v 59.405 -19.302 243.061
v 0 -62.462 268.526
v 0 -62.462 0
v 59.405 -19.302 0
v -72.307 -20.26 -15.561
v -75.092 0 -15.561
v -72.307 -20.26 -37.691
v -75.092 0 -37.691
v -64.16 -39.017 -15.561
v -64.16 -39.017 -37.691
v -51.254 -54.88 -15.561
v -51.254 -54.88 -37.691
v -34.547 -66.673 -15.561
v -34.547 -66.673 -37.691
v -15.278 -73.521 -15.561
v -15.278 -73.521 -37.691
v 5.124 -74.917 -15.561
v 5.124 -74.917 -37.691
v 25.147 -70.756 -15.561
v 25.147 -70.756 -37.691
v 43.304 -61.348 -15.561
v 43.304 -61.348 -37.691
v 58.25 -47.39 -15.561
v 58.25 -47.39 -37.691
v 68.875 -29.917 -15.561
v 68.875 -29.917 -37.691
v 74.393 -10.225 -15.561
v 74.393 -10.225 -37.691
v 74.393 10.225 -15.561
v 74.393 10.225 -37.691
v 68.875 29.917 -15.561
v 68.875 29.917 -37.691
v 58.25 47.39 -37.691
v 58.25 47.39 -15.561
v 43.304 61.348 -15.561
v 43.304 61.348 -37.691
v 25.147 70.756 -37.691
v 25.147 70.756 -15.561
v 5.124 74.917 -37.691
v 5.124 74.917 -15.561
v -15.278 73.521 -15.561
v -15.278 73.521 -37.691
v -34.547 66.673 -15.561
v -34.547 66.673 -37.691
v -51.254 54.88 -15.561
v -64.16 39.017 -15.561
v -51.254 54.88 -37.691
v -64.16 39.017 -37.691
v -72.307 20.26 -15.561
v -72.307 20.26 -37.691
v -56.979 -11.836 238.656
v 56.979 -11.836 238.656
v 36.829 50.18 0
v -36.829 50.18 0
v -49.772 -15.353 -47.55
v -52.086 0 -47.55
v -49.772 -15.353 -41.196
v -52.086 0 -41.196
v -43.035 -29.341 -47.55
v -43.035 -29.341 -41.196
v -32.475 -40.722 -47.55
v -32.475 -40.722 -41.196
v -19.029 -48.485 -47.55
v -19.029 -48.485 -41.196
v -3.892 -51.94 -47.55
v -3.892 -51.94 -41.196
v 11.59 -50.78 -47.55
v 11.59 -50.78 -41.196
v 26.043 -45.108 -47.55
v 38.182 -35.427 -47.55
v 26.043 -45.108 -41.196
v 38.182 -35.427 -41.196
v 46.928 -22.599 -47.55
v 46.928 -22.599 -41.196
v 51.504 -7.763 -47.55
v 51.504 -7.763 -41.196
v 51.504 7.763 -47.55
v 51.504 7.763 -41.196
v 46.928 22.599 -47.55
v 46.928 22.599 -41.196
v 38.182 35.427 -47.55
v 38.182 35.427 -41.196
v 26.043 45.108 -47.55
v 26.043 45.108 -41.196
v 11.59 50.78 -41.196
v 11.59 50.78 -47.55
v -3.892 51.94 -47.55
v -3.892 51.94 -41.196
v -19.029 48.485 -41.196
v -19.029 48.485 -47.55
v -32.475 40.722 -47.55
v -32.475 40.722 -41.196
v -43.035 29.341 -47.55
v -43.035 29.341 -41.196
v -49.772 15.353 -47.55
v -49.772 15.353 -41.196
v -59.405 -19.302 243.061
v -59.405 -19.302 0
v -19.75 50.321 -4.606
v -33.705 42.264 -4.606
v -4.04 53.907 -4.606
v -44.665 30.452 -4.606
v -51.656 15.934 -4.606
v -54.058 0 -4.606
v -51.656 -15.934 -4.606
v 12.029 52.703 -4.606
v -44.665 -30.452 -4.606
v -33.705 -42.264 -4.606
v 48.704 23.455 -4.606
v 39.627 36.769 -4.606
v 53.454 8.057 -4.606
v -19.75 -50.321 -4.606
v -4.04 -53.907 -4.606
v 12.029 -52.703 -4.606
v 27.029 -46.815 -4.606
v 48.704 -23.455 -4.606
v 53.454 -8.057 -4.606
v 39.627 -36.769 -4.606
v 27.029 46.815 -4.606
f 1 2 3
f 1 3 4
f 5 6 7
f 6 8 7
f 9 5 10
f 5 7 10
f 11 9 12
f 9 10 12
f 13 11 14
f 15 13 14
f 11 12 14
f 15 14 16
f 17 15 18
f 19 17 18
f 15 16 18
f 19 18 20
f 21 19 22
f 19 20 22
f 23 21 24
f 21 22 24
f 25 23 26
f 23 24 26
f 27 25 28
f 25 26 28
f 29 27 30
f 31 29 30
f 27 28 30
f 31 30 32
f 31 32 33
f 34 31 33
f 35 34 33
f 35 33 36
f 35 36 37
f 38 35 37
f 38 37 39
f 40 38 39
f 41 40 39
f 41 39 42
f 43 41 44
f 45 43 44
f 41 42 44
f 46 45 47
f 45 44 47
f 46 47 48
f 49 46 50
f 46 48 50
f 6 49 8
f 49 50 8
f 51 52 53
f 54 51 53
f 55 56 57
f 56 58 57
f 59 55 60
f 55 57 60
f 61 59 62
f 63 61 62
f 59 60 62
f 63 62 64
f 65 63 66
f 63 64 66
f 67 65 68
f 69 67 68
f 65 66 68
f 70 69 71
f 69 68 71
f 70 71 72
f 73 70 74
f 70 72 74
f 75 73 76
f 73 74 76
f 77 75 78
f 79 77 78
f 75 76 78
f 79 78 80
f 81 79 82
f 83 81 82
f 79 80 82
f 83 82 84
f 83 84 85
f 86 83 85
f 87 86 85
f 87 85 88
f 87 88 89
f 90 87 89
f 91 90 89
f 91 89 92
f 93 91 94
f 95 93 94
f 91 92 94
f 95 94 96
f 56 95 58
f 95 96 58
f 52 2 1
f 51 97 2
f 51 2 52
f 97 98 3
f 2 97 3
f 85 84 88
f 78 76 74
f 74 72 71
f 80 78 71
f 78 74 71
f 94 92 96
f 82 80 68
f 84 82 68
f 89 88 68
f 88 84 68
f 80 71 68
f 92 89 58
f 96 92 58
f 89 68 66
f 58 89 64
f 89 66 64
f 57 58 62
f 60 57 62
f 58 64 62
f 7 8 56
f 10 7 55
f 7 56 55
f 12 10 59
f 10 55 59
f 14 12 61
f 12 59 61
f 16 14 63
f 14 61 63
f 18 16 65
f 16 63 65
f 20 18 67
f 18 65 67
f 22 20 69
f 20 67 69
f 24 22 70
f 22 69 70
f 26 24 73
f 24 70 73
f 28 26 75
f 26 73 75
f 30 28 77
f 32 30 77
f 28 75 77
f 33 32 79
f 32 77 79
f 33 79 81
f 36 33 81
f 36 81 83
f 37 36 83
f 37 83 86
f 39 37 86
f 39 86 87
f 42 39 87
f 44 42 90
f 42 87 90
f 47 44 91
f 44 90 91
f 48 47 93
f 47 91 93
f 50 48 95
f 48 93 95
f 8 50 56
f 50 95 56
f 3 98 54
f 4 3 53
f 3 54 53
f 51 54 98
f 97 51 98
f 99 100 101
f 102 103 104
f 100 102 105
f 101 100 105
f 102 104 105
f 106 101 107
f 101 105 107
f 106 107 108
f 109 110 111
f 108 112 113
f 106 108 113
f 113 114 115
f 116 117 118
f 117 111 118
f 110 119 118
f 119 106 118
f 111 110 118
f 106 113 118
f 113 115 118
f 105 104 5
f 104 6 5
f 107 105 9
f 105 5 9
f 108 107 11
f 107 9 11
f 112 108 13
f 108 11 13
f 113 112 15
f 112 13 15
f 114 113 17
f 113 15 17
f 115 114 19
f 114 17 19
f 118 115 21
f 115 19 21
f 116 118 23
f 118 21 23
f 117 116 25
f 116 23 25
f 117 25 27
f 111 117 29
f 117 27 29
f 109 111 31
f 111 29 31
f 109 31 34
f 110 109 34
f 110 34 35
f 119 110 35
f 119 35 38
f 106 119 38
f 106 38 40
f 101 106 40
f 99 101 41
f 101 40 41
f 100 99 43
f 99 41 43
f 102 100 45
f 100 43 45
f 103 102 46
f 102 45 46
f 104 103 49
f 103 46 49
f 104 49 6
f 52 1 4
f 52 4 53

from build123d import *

# Parameters (mm, degrees)
F1_DEPTH      = 274.32
F3_DEPTH      = 76.2
F3_DEPTH_BACK = 76.2


with BuildPart() as f1:
    # F0 (on Top) → F1 (new body)
    with BuildSketch(Plane.XY):
        Polygon((36.714105892, 50.5326315761), (-36.714105892, 50.5326315761), (-59.4046711999, -19.3017477211), (0, -62.46176771), (59.4046711999, -19.3017477211), align=None)
    extrude(amount=F1_DEPTH)

    # F2 (on Right) → F3 (cut, two sides)
    with BuildSketch(Plane.YZ) as f3_sk:
        Polygon((53.4598119557, -12.6196304336), (110.7068517473, 303.1274229288), (-68.951100111, 303.1274229288), (-68.951100111, 272.3546624184), (-11.8364533409, 238.6562526226), align=None)
    extrude(amount=-F3_DEPTH, mode=Mode.SUBTRACT)
    extrude(f3_sk.sketch, amount=F3_DEPTH_BACK, mode=Mode.SUBTRACT)


with BuildPart() as f5:
    # F4 (on Front) → F5 (revolve)
    with BuildSketch(Plane.XZ):
        Polygon((0, -41.1962084472), (0, -4.6056029387), (-54.0578626096, -4.6056029387), (-75.0919803977, -15.5608747154), (-75.0919803977, -37.6905240119), (-52.0859137177, -47.5502684712), (-52.0859137177, -41.1962084472), align=None)
    revolve(axis=Axis((0, 0, -22.9009056929), (0, 0, 1)))


solid = Compound([f1.part, f5.part])
